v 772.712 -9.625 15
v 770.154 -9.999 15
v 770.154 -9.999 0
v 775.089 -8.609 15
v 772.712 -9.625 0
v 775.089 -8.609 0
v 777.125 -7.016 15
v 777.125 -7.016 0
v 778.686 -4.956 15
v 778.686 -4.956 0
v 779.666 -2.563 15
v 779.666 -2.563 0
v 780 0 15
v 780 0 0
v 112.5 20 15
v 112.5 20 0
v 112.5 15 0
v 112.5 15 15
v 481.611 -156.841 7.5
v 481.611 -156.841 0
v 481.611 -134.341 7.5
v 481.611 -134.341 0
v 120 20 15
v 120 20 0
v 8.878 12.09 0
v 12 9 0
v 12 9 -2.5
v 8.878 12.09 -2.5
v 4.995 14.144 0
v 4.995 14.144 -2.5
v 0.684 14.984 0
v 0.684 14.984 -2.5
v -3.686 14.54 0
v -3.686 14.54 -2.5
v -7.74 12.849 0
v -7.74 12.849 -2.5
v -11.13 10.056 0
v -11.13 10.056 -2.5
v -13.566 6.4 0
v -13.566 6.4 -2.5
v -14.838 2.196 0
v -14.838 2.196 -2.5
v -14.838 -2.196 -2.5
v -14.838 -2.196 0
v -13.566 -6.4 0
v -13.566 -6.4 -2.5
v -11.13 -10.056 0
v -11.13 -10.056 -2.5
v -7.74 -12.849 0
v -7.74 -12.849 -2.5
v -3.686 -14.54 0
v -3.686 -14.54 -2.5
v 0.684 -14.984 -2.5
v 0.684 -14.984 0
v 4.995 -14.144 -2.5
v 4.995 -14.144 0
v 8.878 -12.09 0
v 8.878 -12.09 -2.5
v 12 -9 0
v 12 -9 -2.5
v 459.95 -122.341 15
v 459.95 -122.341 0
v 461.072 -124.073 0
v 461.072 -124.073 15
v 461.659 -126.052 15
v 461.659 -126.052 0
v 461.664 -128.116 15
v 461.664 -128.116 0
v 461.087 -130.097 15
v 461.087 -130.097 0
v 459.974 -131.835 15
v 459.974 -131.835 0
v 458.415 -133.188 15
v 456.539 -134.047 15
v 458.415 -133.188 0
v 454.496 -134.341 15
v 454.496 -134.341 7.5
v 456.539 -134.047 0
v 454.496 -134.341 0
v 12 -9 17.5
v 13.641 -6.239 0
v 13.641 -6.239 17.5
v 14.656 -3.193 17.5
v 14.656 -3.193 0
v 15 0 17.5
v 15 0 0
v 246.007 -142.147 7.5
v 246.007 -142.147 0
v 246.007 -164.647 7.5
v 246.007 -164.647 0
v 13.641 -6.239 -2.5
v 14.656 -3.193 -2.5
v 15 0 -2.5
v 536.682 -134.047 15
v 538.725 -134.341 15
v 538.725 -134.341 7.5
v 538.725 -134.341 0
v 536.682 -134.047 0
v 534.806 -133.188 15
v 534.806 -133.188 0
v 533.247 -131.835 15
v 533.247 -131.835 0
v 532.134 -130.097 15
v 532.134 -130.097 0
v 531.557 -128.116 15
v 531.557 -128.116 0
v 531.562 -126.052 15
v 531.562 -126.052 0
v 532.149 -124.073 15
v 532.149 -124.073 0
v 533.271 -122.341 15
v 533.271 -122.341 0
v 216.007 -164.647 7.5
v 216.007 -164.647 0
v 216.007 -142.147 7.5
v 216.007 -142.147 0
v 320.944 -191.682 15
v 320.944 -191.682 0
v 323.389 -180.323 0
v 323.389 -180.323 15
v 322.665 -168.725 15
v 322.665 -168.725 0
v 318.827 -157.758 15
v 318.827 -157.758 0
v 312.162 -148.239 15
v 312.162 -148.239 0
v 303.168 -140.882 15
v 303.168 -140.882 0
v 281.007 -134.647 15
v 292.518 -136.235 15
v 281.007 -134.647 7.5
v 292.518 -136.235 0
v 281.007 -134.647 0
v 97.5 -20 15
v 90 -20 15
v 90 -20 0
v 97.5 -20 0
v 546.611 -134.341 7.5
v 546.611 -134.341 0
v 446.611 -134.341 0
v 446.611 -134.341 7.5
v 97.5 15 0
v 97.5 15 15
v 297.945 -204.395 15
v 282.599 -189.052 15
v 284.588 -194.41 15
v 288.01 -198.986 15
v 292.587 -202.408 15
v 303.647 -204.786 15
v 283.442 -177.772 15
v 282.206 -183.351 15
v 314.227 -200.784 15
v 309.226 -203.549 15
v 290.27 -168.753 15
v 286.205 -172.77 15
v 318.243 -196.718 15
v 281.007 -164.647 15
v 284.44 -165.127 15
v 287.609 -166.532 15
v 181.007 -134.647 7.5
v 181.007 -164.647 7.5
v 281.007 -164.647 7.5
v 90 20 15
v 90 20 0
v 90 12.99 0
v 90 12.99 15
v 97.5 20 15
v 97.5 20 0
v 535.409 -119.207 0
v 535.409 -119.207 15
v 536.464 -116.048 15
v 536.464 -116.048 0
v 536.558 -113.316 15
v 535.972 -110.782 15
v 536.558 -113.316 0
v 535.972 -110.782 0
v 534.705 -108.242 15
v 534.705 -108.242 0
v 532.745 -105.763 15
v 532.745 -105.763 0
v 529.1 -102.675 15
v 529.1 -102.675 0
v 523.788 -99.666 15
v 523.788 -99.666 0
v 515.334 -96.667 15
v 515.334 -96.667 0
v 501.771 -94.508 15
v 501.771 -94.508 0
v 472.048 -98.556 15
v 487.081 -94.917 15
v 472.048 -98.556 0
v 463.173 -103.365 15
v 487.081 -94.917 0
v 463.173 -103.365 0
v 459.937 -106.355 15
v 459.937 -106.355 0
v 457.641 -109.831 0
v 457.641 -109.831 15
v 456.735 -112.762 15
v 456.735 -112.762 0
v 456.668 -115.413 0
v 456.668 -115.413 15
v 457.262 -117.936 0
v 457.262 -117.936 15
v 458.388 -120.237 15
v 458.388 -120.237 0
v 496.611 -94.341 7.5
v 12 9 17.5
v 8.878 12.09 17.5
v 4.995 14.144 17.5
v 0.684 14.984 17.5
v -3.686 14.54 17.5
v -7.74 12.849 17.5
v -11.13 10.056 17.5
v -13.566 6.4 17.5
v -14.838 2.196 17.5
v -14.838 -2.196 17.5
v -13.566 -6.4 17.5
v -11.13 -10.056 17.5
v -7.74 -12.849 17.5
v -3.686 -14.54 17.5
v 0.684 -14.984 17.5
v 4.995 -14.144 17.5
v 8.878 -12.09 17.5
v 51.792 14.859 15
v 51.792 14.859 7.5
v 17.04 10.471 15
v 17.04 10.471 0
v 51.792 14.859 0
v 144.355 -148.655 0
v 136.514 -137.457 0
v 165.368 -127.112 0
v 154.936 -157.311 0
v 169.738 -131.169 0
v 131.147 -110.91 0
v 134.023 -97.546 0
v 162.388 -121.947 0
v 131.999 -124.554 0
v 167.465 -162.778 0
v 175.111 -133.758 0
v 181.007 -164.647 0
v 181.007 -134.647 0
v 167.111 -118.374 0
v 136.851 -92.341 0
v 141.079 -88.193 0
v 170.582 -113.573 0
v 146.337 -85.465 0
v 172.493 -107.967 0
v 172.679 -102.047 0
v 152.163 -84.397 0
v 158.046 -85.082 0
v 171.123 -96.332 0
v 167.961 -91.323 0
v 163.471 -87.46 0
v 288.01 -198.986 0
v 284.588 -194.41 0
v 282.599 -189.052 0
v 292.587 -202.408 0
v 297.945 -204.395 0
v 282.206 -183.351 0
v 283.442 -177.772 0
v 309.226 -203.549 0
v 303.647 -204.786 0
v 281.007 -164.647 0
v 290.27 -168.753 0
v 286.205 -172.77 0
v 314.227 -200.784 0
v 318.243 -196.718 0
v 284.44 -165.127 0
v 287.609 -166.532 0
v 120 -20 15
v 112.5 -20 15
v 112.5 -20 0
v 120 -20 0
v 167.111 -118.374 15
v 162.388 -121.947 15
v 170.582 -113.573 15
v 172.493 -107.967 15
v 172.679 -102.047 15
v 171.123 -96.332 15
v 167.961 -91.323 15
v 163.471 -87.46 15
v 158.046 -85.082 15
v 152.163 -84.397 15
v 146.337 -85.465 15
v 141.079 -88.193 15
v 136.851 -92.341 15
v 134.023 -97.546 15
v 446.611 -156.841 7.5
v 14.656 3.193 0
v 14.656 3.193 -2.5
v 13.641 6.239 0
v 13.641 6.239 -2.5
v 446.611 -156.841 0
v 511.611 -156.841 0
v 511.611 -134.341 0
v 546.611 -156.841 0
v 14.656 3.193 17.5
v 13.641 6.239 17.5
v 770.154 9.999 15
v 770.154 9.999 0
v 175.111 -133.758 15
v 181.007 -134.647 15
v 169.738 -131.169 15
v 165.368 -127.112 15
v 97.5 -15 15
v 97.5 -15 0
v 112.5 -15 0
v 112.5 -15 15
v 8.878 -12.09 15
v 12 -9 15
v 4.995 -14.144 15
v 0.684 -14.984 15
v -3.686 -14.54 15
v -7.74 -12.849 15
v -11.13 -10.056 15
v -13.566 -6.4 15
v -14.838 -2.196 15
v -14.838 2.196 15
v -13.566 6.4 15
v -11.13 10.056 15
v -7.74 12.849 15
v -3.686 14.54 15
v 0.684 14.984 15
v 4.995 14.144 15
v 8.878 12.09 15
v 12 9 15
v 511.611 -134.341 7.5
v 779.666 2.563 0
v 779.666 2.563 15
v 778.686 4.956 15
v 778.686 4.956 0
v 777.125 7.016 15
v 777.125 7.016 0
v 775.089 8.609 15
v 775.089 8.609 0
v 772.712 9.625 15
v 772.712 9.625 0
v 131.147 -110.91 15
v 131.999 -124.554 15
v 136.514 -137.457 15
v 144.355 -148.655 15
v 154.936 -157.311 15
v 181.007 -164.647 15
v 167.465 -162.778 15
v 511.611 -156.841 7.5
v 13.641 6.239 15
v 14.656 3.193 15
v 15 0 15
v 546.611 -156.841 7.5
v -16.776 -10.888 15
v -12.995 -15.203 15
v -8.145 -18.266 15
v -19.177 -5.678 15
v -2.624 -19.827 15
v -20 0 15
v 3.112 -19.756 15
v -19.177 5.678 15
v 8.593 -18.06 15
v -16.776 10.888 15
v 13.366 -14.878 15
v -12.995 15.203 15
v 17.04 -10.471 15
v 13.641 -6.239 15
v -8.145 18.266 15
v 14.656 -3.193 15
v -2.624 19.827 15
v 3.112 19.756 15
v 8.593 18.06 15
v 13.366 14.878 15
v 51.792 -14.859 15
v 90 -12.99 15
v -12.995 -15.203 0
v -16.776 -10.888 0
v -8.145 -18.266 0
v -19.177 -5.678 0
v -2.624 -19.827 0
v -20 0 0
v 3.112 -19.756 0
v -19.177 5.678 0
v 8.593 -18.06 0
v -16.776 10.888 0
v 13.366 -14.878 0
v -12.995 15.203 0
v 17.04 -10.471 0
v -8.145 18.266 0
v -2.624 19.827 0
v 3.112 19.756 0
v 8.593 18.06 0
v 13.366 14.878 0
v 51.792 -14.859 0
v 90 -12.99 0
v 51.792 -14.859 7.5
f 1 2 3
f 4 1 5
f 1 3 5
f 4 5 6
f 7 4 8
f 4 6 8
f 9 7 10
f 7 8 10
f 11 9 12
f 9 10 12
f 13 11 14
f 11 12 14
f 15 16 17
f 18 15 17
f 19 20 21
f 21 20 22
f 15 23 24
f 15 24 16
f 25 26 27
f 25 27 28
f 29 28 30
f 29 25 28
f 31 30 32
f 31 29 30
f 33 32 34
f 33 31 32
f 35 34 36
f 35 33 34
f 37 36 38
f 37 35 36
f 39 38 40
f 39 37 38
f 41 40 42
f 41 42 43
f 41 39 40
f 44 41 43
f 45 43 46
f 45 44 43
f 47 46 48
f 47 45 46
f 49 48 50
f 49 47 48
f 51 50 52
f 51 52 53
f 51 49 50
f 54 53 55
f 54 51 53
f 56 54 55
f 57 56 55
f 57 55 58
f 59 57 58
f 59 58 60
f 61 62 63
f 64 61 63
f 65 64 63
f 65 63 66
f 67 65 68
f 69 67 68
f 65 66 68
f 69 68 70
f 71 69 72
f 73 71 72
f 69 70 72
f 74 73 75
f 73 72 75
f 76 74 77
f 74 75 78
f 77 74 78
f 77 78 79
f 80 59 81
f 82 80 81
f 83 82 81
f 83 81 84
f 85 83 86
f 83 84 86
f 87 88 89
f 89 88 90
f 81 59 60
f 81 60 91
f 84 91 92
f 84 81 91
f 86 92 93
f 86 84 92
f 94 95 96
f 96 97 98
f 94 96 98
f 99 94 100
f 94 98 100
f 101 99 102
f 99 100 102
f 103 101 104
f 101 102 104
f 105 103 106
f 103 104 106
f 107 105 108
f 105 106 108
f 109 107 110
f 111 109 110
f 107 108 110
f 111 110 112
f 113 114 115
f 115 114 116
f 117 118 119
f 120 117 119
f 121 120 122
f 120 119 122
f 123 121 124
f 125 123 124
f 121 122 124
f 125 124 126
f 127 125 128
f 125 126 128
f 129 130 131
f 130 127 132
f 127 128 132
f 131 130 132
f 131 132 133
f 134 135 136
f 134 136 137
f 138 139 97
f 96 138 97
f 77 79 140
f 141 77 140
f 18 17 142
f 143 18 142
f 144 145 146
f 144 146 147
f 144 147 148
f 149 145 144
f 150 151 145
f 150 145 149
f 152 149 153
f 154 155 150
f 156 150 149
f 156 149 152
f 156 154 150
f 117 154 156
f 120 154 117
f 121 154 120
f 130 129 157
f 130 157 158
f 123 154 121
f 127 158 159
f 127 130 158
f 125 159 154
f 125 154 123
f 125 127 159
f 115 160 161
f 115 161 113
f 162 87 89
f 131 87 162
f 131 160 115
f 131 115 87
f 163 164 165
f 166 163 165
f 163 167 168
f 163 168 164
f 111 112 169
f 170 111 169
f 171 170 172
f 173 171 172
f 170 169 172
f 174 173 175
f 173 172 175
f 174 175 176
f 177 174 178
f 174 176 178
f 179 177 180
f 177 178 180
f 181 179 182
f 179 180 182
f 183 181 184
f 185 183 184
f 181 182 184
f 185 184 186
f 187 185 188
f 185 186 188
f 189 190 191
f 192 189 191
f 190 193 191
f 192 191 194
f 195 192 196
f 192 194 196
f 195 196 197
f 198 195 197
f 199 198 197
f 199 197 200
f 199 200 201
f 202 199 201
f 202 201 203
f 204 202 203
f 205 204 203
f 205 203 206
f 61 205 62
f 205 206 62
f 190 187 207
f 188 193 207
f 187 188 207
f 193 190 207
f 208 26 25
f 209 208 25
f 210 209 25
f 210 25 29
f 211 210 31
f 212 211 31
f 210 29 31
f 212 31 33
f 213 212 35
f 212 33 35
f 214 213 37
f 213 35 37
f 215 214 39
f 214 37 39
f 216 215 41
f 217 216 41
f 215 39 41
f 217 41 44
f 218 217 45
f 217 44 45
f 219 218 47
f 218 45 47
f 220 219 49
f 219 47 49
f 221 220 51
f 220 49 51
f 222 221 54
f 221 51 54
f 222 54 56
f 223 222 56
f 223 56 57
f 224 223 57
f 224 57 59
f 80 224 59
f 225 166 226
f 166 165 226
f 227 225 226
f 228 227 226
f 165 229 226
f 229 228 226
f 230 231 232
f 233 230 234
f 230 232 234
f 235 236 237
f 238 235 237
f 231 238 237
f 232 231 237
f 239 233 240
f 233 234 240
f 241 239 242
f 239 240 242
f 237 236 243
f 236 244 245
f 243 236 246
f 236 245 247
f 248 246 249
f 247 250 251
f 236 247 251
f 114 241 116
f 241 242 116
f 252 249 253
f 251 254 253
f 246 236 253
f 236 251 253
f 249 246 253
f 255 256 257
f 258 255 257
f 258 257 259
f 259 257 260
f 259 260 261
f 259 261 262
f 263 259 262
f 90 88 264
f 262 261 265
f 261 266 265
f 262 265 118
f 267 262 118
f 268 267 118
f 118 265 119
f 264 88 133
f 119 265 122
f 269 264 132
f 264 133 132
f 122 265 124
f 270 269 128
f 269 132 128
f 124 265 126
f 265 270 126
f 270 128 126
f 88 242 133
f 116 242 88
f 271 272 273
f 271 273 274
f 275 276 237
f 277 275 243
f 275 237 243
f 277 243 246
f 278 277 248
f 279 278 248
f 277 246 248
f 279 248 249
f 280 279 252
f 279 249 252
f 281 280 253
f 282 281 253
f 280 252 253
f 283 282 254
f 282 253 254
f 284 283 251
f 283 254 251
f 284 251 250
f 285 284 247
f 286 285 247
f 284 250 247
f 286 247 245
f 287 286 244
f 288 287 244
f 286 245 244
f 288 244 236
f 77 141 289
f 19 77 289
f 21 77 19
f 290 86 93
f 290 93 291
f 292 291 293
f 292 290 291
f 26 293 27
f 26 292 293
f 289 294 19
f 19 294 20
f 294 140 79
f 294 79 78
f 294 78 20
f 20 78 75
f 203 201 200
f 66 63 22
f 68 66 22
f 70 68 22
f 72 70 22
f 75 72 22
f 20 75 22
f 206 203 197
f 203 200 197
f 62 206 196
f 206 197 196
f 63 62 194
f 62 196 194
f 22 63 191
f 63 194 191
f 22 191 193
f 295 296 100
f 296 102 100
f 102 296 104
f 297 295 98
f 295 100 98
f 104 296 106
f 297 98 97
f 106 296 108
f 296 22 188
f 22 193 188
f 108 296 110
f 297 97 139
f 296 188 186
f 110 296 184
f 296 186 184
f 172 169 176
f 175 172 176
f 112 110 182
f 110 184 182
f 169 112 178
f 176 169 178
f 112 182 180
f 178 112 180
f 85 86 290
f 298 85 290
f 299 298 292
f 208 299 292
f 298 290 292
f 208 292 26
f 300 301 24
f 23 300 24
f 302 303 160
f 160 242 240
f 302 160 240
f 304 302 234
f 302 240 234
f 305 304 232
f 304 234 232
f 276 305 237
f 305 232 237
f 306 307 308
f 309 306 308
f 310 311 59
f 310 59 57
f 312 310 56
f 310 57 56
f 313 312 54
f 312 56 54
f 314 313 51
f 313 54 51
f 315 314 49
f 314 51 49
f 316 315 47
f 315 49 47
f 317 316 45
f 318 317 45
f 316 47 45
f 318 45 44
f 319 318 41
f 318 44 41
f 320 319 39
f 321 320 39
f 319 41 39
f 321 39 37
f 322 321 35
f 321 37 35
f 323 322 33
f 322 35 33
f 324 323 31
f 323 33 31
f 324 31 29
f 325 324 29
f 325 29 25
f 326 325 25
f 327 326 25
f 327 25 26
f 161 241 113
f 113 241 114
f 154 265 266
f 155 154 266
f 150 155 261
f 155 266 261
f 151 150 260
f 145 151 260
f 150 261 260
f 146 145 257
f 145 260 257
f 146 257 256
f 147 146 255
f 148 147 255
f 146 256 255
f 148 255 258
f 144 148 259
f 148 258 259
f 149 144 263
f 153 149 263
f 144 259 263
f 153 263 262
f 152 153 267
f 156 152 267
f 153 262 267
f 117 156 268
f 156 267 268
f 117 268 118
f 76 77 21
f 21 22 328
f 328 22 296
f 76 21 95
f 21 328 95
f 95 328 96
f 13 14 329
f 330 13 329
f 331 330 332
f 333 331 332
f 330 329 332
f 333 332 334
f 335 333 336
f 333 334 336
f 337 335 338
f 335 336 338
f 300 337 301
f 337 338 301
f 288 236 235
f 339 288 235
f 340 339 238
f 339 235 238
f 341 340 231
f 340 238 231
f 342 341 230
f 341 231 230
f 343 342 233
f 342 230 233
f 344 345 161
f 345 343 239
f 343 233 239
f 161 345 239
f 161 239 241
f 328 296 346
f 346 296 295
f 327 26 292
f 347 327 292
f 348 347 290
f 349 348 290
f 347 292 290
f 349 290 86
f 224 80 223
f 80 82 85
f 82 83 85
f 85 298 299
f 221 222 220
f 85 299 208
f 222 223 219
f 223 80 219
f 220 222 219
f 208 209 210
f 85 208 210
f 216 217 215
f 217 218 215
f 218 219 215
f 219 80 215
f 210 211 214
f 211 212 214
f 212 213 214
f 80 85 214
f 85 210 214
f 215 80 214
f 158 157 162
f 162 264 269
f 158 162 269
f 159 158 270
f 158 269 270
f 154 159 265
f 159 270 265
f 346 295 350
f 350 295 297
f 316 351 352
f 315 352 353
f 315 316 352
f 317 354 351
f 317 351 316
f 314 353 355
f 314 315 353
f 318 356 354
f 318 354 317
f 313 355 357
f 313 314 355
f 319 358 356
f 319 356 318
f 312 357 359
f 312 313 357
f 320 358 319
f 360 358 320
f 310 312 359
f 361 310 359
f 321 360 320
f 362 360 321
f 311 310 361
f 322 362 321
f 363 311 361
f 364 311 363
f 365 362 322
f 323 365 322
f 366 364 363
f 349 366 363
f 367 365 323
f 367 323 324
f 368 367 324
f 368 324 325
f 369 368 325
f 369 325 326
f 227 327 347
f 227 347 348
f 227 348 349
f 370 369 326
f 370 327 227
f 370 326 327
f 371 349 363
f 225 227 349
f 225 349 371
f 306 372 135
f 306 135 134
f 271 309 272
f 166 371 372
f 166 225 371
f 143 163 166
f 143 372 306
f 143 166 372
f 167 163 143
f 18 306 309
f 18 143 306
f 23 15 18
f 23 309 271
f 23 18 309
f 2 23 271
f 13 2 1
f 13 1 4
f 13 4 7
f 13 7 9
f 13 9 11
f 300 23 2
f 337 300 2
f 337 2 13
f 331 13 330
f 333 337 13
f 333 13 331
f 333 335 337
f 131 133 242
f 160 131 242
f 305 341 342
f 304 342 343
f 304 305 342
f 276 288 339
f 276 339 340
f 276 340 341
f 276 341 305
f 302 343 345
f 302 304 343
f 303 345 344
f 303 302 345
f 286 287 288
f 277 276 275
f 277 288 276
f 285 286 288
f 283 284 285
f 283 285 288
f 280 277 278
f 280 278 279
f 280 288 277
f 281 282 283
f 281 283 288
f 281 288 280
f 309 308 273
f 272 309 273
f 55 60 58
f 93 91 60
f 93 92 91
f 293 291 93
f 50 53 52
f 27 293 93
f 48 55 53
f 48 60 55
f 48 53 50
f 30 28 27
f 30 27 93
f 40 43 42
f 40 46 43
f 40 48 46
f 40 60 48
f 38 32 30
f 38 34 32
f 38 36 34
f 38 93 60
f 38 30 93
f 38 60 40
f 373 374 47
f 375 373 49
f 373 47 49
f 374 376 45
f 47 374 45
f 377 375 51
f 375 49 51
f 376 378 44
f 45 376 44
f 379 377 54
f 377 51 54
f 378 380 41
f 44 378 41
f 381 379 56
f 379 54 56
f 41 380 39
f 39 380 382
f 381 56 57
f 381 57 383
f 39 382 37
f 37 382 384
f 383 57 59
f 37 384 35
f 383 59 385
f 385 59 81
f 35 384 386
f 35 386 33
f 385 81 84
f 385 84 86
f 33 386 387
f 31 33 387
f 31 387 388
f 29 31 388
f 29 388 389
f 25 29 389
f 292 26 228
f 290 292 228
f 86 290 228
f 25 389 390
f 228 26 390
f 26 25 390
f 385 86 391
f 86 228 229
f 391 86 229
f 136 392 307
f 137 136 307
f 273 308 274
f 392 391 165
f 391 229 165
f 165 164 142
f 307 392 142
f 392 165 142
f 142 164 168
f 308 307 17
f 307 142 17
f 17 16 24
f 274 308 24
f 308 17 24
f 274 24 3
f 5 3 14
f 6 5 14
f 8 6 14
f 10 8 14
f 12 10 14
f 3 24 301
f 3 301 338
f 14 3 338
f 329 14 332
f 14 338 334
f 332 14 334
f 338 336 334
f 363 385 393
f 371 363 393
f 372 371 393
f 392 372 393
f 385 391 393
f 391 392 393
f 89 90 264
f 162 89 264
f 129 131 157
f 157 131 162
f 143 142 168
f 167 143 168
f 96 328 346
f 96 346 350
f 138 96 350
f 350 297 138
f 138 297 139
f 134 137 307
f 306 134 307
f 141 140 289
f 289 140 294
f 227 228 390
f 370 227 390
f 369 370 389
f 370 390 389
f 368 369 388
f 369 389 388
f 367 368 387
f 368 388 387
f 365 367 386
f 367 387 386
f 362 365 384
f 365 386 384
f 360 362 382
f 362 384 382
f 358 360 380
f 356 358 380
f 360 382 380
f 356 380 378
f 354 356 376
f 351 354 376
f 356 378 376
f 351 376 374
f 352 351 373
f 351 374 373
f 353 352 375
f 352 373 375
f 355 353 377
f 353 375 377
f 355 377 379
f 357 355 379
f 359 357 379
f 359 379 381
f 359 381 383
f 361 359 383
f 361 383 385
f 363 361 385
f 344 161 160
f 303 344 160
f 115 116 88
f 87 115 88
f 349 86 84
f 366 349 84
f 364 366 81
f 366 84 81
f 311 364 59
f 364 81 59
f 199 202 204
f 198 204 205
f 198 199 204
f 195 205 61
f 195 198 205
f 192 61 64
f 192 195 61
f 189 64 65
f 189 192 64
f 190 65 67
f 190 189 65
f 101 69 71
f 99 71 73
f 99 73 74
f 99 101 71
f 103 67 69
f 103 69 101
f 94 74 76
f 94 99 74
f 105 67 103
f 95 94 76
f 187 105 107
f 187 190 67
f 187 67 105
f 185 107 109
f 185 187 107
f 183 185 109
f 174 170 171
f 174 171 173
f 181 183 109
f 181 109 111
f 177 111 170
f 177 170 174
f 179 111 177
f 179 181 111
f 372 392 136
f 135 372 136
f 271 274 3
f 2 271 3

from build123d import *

# Parameters (mm, degrees)
F1_DEPTH      = 15
F0_W          = 35
F0_H          = 7.5
F2_DEPTH      = 7.5
F3_DEPTH      = 7.5
F4_DEPTH      = 17.5
F4_DEPTH_BACK = 2.5


# Not quite as in the source:
# - a feature names something its author has since deleted; it is built from what else it names


with BuildPart() as f1:
    # F0 (on Top) → F1 (new body)
    with BuildSketch(Plane.XY):
        with BuildLine():
            Line((90, 20), (90, 12.9903810568))
            add(Edge.make_bspline(
                [(90, -12.9903810568), (180, 0), (90, 12.9903810568)],
                knots=[2.0943951024, 2.0943951024, 2.0943951024, 4.1887902048, 4.1887902048, 4.1887902048], degree=2, weights=[1, 0.5, 1]))
            Line((90, -12.9903810568), (90, -20))
            Line((90, -20), (97.5, -20))
            Line((97.5, -20), (97.5, -15))
            Line((97.5, -15), (112.5, -15))
            Line((112.5, -15), (112.5, -20))
            Line((112.5, -20), (120, -20))
            Line((120, -20), (770.1538097556, -9.998817058))
            ThreePointArc((770.1538097556, -9.998817058), (760, 0), (770.1538097556, 9.998817058))
            Line((770.1538097556, 9.998817058), (120, 20))
            Line((120, 20), (112.5, 20))
            Line((112.5, 20), (112.5, 15))
            Line((112.5, 15), (97.5, 15))
            Line((97.5, 15), (97.5, 20))
            Line((97.5, 20), (90, 20))
        make_face()
        with BuildLine():
            add(Edge.make_bspline(
                [(90, -12.9903810568), (180, 0), (90, 12.9903810568)],
                knots=[2.0943951024, 2.0943951024, 2.0943951024, 4.1887902048, 4.1887902048, 4.1887902048], degree=2, weights=[1, 0.5, 1]))
            Line((90, 12.9903810568), (90, -12.9903810568))
        make_face()
        with BuildLine():
            ThreePointArc((17.0396451174, -10.4714131937), (19.2456865602, -5.4409143373), (20, 0))
            ThreePointArc((20, 0), (19.2456865602, 5.4409143373), (17.0396451174, 10.4714131937))
            add(Edge.make_bspline(
                [(17.0396451174, 10.4714131937), (14.3294049387, 9.7764683129), (12, 9)],
                knots=[5.5104529682, 5.5104529682, 5.5104529682, 5.6396841984, 5.6396841984, 5.6396841984], degree=2, weights=[1, 0.9979131374, 1]))
            ThreePointArc((12, 9), (14.2302494708, 4.7434164903), (15, 0))
            ThreePointArc((15, 0), (14.2302494708, -4.7434164903), (12, -9))
            add(Edge.make_bspline(
                [(12, -9), (14.3294049387, -9.7764683129), (17.0396451174, -10.4714131937)],
                knots=[0.6435011088, 0.6435011088, 0.6435011088, 0.7727323389, 0.7727323389, 0.7727323389], degree=2, weights=[1, 0.9979131374, 1]))
        make_face()
        with BuildLine():
            add(Edge.make_bspline(
                [(17.0396451174, 10.4714131937), (14.3294049387, 9.7764683129), (12, 9)],
                knots=[5.5104529682, 5.5104529682, 5.5104529682, 5.6396841984, 5.6396841984, 5.6396841984], degree=2, weights=[1, 0.9979131374, 1]))
            ThreePointArc((17.0396451174, 10.4714131937), (-20, 0), (17.0396451174, -10.4714131937))
            add(Edge.make_bspline(
                [(12, -9), (14.3294049387, -9.7764683129), (17.0396451174, -10.4714131937)],
                knots=[0.6435011088, 0.6435011088, 0.6435011088, 0.7727323389, 0.7727323389, 0.7727323389], degree=2, weights=[1, 0.9979131374, 1]))
            ThreePointArc((12, -9), (-15, 0), (12, 9))
        make_face()
        with BuildLine():
            ThreePointArc((17.0396451174, 10.4714131937), (19.2456865602, 5.4409143373), (20, 0))
            ThreePointArc((20, 0), (19.2456865602, -5.4409143373), (17.0396451174, -10.4714131937))
            add(Edge.make_bspline(
                [(17.0396451174, -10.4714131937), (49.6031402439, -18.8211655204), (90, -12.9903810568)],
                knots=[0.7727323389, 0.7727323389, 0.7727323389, 2.0943951024, 2.0943951024, 2.0943951024], degree=2, weights=[1, 0.7894822244, 1]))
            Line((90, -12.9903810568), (90, 12.9903810568))
            add(Edge.make_bspline(
                [(90, 12.9903810568), (49.6031402439, 18.8211655204), (17.0396451174, 10.4714131937)],
                knots=[4.1887902048, 4.1887902048, 4.1887902048, 5.5104529682, 5.5104529682, 5.5104529682], degree=2, weights=[1, 0.7894822244, 1]))
        make_face()
        with BuildLine():
            ThreePointArc((780, 0), (777.1252402611, 7.0164771233), (770.1538097556, 9.998817058))
            ThreePointArc((770.1538097556, 9.998817058), (760, 0), (770.1538097556, -9.998817058))
            ThreePointArc((770.1538097556, -9.998817058), (777.1252402611, -7.0164771233), (780, 0))
        make_face()
    extrude(amount=F1_DEPTH)


with BuildPart() as f1b:
    # F0 (on Top) → F1, piece 2 (new body)
    with BuildSketch(Plane.XY):
        with BuildLine():
            Line((181.0074592861, -142.1465528079), (181.0074592861, -134.6465528079))
            ThreePointArc((181.0074592861, -134.6465528079), (169.7383256758, -131.1694650111), (162.3875687612, -121.9472155752))
            ThreePointArc((162.3875687612, -121.9472155752), (165.8599218849, -89.2243569553), (134.0228282468, -97.5455456416))
            ThreePointArc((134.0228282468, -97.5455456416), (140.0498570717, -143.3253746254), (181.0074592861, -164.6465528079))
            Line((181.0074592861, -164.6465528079), (181.0074592861, -149.6465528079))
            Line((181.0074592861, -149.6465528079), (181.0074592861, -142.1465528079))
        make_face()
    extrude(amount=F1_DEPTH)



with BuildPart() as f1c:
    # F0 (on Top) → F1, piece 3 (new body)
    with BuildSketch(Plane.XY):
        with BuildLine():
            ThreePointArc((320.9443956695, -191.6824088992), (315.8214211684, -152.769554263), (281.0074592861, -134.6465528079))
            Line((281.0074592861, -134.6465528079), (281.0074592861, -142.1465528079))
            Line((281.0074592861, -142.1465528079), (281.0074592861, -149.6465528079))
            Line((281.0074592861, -149.6465528079), (281.0074592861, -164.6465528079))
            ThreePointArc((281.0074592861, -164.6465528079), (286.0735380817, -165.7191801598), (290.2701745279, -168.7529775059))
            ThreePointArc((290.2701745279, -168.7529775059), (290.1760382458, -200.8610955765), (320.9443956695, -191.6824088992))
        make_face()
    extrude(amount=F1_DEPTH)


with BuildPart() as f1d:
    # F0 (on Top) → F1, piece 4 (new body)
    with BuildSketch(Plane.XY):
        with BuildLine():
            add(Edge.make_bspline(
                [(527.8355032662, -126.8409866095), (531.1499030026, -124.7711446375), (533.2711188339, -122.3409866095)],
                knots=[5.6080537742, 5.6080537742, 5.6080537742, 5.8716684611, 5.8716684611, 5.8716684611], degree=2, weights=[1, 0.991325981, 1]))
            add(Edge.make_bspline(
                [(533.2711188339, -122.3409866095), (557.7115225403, -94.3409866095), (496.6105132742, -94.3409866095), (435.5095040081, -94.3409866095), (459.9499077146, -122.3409866095)],
                knots=[5.8716684611, 5.8716684611, 5.8716684611, 7.853981634, 7.853981634, 9.8362948068, 9.8362948068, 9.8362948068], degree=2, weights=[1, 0.5477225575, 1, 0.5477225575, 1]))
            add(Edge.make_bspline(
                [(459.9499077146, -122.3409866095), (462.0711235458, -124.7711446375), (465.3855232822, -126.8409866095)],
                knots=[3.5531094997, 3.5531094997, 3.5531094997, 3.8167241865, 3.8167241865, 3.8167241865], degree=2, weights=[1, 0.991325981, 1]))
            Line((465.3855232822, -126.8409866095), (527.8355032662, -126.8409866095))
        make_face()
        with BuildLine():
            add(Edge.make_bspline(
                [(465.3855232822, -126.8409866095), (477.3951348176, -134.3409866095), (496.6105132742, -134.3409866095)],
                knots=[3.8167241865, 3.8167241865, 3.8167241865, 4.7123889804, 4.7123889804, 4.7123889804], degree=2, weights=[1, 0.9013878189, 1]))
            add(Edge.make_bspline(
                [(496.6105132742, -134.3409866095), (515.8258917308, -134.3409866095), (527.8355032662, -126.8409866095)],
                knots=[4.7123889804, 4.7123889804, 4.7123889804, 5.6080537742, 5.6080537742, 5.6080537742], degree=2, weights=[1, 0.9013878189, 1]))
            Line((527.8355032662, -126.8409866095), (465.3855232822, -126.8409866095))
        make_face()
        with BuildLine():
            Line((454.4959551719, -134.3409866095), (481.6105132742, -134.3409866095))
            Line((481.6105132742, -134.3409866095), (496.6105132742, -134.3409866095))
            add(Edge.make_bspline(
                [(465.3855232822, -126.8409866095), (477.3951348176, -134.3409866095), (496.6105132742, -134.3409866095)],
                knots=[3.8167241865, 3.8167241865, 3.8167241865, 4.7123889804, 4.7123889804, 4.7123889804], degree=2, weights=[1, 0.9013878189, 1]))
            add(Edge.make_bspline(
                [(459.9499077146, -122.3409866095), (462.0711235458, -124.7711446375), (465.3855232822, -126.8409866095)],
                knots=[3.5531094997, 3.5531094997, 3.5531094997, 3.8167241865, 3.8167241865, 3.8167241865], degree=2, weights=[1, 0.991325981, 1]))
            ThreePointArc((459.9499077146, -122.3409866095), (461.0865848523, -130.097001804), (454.4959551719, -134.3409866095))
        make_face()
        with BuildLine():
            Line((496.6105132742, -134.3409866095), (511.6105132742, -134.3409866095))
            Line((511.6105132742, -134.3409866095), (538.7250713765, -134.3409866095))
            ThreePointArc((538.7250713765, -134.3409866095), (532.1344416961, -130.097001804), (533.2711188339, -122.3409866095))
            add(Edge.make_bspline(
                [(527.8355032662, -126.8409866095), (531.1499030026, -124.7711446375), (533.2711188339, -122.3409866095)],
                knots=[5.6080537742, 5.6080537742, 5.6080537742, 5.8716684611, 5.8716684611, 5.8716684611], degree=2, weights=[1, 0.991325981, 1]))
            add(Edge.make_bspline(
                [(496.6105132742, -134.3409866095), (515.8258917308, -134.3409866095), (527.8355032662, -126.8409866095)],
                knots=[4.7123889804, 4.7123889804, 4.7123889804, 5.6080537742, 5.6080537742, 5.6080537742], degree=2, weights=[1, 0.9013878189, 1]))
        make_face()
    extrude(amount=F1_DEPTH)

    # F0 (on Top) → F2 (join)
    with BuildSketch(Plane.XY):
        Polygon((511.6105132742, -141.8409866095), (546.6105132742, -141.8409866095), (546.6105132742, -134.3409866095), (538.7250713765, -134.3409866095), (511.6105132742, -134.3409866095), align=None)
        Polygon((446.6105132742, -141.8409866095), (481.6105132742, -141.8409866095), (481.6105132742, -134.3409866095), (454.4959551719, -134.3409866095), (446.6105132742, -134.3409866095), align=None)
        with Locations((529.1105132742, -153.0909866095)):
            Rectangle(F0_W, F0_H)
        with Locations((529.1105132742, -145.5909866095)):
            Rectangle(F0_W, F0_H)
        with Locations((464.1105132742, -153.0909866095)):
            Rectangle(F0_W, F0_H)
        with Locations((464.1105132742, -145.5909866095)):
            Rectangle(F0_W, F0_H)
    extrude(amount=F2_DEPTH)


with BuildPart() as f1b_1:
    add(f1b.part)

    add(f1c.part)  # F3 merges F1c
    # F0 (on Top) → F3 (join)
    with BuildSketch(Plane.XY):
        Polygon((281.0074592861, -134.6465528079), (181.0074592861, -134.6465528079), (181.0074592861, -142.1465528079), (216.0074592861, -142.1465528079), (246.0074592861, -142.1465528079), (281.0074592861, -142.1465528079), align=None)
        Polygon((216.0074592861, -142.1465528079), (181.0074592861, -142.1465528079), (181.0074592861, -149.6465528079), (181.0074592861, -164.6465528079), (216.0074592861, -164.6465528079), (216.0074592861, -157.1465528079), align=None)
        Polygon((281.0074592861, -149.6465528079), (281.0074592861, -142.1465528079), (246.0074592861, -142.1465528079), (246.0074592861, -157.1465528079), (246.0074592861, -164.6465528079), (281.0074592861, -164.6465528079), align=None)
    extrude(amount=F3_DEPTH)


with BuildPart() as f4:
    # F0 (on Top) → F4 (new body, two sides)
    with BuildSketch(Plane.XY) as f4_sk:
        with BuildLine():
            add(Edge.make_bspline(
                [(12, 9), (0, 5), (0, 0)],
                knots=[5.6396841984, 5.6396841984, 5.6396841984, 6.2831853072, 6.2831853072, 6.2831853072], degree=2, weights=[1, 0.9486832981, 1]))
            ThreePointArc((12, 9), (-15, 0), (12, -9))
            add(Edge.make_bspline(
                [(0, 0), (0, -5), (12, -9)],
                knots=[0, 0, 0, 0.6435011088, 0.6435011088, 0.6435011088], degree=2, weights=[1, 0.9486832981, 1]))
        make_face()
        with BuildLine():
            ThreePointArc((15, 0), (14.2302494708, 4.7434164903), (12, 9))
            add(Edge.make_bspline(
                [(12, 9), (0, 5), (0, 0)],
                knots=[5.6396841984, 5.6396841984, 5.6396841984, 6.2831853072, 6.2831853072, 6.2831853072], degree=2, weights=[1, 0.9486832981, 1]))
            add(Edge.make_bspline(
                [(0, 0), (0, -5), (12, -9)],
                knots=[0, 0, 0, 0.6435011088, 0.6435011088, 0.6435011088], degree=2, weights=[1, 0.9486832981, 1]))
            ThreePointArc((12, -9), (14.2302494708, -4.7434164903), (15, 0))
        make_face()
    extrude(amount=F4_DEPTH)
    extrude(f4_sk.sketch, amount=-F4_DEPTH_BACK)


solid = Compound([f1.part, f1d.part, f1b_1.part, f4.part])
